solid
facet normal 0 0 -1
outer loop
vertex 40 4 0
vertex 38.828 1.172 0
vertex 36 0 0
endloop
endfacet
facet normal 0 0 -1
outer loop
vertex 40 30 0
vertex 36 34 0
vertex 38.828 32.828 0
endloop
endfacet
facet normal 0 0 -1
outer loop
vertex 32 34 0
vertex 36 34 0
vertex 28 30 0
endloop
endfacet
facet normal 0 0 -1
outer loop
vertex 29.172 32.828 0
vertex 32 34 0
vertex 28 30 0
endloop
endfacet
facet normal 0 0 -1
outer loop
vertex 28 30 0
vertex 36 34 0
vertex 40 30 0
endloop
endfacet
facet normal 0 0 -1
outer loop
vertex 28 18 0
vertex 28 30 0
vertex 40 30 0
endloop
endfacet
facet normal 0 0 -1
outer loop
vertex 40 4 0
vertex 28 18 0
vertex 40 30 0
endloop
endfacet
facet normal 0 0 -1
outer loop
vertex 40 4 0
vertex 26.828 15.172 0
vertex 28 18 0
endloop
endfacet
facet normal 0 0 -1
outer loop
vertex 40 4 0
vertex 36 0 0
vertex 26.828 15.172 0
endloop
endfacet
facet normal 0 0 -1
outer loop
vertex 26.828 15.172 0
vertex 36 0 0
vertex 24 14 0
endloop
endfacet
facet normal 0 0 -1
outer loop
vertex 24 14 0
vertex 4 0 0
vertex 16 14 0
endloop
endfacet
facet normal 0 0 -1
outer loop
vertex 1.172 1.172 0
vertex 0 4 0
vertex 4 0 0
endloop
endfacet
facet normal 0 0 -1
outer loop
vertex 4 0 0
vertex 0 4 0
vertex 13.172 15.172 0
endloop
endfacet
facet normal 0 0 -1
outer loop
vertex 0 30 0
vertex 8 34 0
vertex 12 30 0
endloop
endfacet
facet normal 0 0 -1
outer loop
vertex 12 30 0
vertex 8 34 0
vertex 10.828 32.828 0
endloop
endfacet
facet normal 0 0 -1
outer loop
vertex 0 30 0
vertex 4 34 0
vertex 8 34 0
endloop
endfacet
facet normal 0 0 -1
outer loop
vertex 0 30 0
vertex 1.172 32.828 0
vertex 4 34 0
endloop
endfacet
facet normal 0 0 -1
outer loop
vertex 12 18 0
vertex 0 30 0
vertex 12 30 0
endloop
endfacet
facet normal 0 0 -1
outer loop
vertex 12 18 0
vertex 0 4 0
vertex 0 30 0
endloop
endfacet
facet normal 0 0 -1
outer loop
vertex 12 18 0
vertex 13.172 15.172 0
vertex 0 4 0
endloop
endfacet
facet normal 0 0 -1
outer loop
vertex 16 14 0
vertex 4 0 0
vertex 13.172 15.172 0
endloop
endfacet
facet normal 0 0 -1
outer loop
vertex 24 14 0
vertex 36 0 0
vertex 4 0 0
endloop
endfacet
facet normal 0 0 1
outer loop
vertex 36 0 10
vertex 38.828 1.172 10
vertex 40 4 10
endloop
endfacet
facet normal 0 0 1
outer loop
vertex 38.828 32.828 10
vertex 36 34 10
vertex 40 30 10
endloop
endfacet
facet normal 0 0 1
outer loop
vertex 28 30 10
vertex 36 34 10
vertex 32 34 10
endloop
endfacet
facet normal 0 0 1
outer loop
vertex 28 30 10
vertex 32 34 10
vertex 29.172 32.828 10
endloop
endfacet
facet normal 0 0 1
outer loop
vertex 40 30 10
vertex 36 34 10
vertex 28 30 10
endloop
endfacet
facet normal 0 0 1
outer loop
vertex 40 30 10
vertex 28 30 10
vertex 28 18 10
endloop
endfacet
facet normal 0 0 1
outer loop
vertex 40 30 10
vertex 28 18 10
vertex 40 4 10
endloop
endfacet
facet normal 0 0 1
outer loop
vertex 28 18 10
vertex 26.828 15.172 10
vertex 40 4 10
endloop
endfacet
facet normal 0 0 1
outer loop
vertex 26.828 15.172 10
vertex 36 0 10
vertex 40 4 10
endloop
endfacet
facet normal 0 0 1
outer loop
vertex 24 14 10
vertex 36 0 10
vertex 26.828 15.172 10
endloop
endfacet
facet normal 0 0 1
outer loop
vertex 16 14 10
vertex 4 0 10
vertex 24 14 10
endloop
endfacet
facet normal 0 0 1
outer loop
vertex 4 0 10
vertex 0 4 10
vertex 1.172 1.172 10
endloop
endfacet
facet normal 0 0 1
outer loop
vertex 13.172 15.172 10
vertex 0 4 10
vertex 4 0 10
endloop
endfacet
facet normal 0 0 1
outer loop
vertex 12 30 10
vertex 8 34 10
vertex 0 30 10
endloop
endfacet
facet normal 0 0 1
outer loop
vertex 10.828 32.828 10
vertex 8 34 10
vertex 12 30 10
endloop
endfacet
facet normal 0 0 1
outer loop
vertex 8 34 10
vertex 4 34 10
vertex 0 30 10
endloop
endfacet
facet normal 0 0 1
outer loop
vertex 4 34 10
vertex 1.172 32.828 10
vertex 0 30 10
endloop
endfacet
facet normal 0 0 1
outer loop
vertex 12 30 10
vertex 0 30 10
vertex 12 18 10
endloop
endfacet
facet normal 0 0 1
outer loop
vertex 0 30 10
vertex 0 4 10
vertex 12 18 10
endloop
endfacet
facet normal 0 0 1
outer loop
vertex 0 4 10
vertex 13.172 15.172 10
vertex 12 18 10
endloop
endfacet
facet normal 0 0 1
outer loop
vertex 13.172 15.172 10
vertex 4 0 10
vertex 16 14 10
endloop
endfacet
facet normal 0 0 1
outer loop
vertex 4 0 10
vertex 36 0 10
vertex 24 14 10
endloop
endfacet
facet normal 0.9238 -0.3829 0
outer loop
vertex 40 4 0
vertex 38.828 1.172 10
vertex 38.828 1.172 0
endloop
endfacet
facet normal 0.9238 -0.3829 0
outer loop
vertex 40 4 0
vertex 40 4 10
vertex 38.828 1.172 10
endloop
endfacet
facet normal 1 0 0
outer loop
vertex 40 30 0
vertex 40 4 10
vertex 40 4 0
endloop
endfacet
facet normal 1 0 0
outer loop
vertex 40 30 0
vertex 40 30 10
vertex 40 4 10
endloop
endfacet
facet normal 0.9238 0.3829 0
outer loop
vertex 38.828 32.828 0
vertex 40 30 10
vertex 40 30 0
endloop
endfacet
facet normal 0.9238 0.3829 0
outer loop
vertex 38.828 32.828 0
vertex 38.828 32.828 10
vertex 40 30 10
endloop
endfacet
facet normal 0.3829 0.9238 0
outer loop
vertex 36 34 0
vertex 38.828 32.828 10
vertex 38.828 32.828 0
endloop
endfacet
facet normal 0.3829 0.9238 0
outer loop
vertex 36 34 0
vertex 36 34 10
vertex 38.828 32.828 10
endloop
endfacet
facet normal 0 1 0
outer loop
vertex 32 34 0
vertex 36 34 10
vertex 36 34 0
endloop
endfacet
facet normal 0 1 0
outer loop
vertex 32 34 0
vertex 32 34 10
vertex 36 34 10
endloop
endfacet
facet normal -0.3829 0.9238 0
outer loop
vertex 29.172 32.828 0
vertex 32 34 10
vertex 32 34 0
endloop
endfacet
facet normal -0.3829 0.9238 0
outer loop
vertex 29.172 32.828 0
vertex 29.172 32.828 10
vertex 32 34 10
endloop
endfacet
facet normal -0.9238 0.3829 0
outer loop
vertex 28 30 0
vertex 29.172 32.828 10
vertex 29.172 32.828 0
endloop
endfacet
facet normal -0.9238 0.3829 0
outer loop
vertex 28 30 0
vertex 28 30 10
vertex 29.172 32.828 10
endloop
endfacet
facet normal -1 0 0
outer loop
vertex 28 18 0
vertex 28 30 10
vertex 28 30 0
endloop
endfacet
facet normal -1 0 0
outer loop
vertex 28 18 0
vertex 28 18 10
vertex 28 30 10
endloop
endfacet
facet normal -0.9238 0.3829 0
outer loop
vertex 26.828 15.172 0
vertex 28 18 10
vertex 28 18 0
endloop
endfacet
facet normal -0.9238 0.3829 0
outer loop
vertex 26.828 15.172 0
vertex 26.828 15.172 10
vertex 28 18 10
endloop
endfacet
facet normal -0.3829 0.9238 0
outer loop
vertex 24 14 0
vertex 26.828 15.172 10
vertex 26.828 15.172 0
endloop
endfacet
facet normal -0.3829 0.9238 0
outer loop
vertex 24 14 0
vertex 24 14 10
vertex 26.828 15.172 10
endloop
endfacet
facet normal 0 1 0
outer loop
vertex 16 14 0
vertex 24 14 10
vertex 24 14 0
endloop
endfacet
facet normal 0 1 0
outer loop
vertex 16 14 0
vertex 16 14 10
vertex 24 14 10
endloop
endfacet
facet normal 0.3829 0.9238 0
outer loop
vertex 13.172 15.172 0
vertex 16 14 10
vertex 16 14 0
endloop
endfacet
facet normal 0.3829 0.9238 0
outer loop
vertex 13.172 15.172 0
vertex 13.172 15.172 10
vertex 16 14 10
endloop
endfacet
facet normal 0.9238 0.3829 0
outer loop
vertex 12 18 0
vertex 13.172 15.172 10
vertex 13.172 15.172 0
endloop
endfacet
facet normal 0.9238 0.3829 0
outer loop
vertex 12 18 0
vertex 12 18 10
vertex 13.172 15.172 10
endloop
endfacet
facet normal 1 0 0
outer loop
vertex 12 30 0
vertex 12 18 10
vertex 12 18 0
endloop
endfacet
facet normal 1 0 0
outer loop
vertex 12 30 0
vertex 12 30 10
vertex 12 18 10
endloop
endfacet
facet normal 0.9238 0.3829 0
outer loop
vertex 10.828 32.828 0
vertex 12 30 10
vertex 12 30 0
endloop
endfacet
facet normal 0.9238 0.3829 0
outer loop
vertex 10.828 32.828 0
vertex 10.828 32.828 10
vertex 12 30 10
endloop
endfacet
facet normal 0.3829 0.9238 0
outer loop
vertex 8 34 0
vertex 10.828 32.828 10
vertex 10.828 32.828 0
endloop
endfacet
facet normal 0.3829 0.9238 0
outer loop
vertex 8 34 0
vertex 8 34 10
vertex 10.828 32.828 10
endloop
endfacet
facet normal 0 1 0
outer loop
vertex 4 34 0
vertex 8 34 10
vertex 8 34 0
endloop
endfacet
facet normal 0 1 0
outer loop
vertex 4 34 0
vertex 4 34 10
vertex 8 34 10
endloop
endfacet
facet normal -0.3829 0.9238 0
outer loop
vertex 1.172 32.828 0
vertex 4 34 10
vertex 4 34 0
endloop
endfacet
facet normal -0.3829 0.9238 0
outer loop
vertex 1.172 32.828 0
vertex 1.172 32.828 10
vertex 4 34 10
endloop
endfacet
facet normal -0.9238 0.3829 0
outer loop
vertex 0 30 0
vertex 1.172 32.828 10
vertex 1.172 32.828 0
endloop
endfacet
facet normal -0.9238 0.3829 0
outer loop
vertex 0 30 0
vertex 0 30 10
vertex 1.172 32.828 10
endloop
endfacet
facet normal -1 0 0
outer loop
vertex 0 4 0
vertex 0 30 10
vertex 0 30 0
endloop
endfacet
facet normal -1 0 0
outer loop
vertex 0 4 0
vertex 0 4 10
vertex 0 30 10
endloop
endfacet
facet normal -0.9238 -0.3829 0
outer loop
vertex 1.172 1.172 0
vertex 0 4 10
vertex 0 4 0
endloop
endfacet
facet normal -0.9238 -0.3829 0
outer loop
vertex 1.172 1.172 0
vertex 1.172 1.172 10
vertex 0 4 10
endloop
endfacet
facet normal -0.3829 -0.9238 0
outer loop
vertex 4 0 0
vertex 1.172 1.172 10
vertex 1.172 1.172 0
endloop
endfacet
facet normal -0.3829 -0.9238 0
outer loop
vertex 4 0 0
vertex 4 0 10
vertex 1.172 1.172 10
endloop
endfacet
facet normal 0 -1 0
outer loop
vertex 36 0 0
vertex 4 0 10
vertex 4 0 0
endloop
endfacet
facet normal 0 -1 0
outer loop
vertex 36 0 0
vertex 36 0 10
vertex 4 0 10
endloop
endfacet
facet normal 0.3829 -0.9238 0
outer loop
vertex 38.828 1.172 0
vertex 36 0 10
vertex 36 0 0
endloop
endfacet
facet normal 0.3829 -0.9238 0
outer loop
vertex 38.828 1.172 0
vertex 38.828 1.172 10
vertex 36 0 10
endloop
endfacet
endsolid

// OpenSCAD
$fn = 32;

// ----------------------------------------------------------------------
// Eye lug: clevis, 10 mm thick
// ----------------------------------------------------------------------

// --- parameters (mm) ---
profile_height = 10;      // extrusion height
profile_points = 24;      // points of the closed outline

profile = [[0, 4], [1.172, 1.172], [4, 0], [36, 0], [38.828, 1.172], [40, 4], [40, 30], [38.828, 32.828], [36, 34], [32, 34], [29.172, 32.828], [28, 30], [28, 18], [26.828, 15.172], [24, 14], [16, 14], [13.172, 15.172], [12, 18], [12, 30], [10.828, 32.828], [8, 34], [4, 34], [1.172, 32.828], [0, 30]];  // single closed polygon, 24 points, counter clockwise

// --- the one profile operation ---
linear_extrude(height = profile_height) polygon(points = profile);
